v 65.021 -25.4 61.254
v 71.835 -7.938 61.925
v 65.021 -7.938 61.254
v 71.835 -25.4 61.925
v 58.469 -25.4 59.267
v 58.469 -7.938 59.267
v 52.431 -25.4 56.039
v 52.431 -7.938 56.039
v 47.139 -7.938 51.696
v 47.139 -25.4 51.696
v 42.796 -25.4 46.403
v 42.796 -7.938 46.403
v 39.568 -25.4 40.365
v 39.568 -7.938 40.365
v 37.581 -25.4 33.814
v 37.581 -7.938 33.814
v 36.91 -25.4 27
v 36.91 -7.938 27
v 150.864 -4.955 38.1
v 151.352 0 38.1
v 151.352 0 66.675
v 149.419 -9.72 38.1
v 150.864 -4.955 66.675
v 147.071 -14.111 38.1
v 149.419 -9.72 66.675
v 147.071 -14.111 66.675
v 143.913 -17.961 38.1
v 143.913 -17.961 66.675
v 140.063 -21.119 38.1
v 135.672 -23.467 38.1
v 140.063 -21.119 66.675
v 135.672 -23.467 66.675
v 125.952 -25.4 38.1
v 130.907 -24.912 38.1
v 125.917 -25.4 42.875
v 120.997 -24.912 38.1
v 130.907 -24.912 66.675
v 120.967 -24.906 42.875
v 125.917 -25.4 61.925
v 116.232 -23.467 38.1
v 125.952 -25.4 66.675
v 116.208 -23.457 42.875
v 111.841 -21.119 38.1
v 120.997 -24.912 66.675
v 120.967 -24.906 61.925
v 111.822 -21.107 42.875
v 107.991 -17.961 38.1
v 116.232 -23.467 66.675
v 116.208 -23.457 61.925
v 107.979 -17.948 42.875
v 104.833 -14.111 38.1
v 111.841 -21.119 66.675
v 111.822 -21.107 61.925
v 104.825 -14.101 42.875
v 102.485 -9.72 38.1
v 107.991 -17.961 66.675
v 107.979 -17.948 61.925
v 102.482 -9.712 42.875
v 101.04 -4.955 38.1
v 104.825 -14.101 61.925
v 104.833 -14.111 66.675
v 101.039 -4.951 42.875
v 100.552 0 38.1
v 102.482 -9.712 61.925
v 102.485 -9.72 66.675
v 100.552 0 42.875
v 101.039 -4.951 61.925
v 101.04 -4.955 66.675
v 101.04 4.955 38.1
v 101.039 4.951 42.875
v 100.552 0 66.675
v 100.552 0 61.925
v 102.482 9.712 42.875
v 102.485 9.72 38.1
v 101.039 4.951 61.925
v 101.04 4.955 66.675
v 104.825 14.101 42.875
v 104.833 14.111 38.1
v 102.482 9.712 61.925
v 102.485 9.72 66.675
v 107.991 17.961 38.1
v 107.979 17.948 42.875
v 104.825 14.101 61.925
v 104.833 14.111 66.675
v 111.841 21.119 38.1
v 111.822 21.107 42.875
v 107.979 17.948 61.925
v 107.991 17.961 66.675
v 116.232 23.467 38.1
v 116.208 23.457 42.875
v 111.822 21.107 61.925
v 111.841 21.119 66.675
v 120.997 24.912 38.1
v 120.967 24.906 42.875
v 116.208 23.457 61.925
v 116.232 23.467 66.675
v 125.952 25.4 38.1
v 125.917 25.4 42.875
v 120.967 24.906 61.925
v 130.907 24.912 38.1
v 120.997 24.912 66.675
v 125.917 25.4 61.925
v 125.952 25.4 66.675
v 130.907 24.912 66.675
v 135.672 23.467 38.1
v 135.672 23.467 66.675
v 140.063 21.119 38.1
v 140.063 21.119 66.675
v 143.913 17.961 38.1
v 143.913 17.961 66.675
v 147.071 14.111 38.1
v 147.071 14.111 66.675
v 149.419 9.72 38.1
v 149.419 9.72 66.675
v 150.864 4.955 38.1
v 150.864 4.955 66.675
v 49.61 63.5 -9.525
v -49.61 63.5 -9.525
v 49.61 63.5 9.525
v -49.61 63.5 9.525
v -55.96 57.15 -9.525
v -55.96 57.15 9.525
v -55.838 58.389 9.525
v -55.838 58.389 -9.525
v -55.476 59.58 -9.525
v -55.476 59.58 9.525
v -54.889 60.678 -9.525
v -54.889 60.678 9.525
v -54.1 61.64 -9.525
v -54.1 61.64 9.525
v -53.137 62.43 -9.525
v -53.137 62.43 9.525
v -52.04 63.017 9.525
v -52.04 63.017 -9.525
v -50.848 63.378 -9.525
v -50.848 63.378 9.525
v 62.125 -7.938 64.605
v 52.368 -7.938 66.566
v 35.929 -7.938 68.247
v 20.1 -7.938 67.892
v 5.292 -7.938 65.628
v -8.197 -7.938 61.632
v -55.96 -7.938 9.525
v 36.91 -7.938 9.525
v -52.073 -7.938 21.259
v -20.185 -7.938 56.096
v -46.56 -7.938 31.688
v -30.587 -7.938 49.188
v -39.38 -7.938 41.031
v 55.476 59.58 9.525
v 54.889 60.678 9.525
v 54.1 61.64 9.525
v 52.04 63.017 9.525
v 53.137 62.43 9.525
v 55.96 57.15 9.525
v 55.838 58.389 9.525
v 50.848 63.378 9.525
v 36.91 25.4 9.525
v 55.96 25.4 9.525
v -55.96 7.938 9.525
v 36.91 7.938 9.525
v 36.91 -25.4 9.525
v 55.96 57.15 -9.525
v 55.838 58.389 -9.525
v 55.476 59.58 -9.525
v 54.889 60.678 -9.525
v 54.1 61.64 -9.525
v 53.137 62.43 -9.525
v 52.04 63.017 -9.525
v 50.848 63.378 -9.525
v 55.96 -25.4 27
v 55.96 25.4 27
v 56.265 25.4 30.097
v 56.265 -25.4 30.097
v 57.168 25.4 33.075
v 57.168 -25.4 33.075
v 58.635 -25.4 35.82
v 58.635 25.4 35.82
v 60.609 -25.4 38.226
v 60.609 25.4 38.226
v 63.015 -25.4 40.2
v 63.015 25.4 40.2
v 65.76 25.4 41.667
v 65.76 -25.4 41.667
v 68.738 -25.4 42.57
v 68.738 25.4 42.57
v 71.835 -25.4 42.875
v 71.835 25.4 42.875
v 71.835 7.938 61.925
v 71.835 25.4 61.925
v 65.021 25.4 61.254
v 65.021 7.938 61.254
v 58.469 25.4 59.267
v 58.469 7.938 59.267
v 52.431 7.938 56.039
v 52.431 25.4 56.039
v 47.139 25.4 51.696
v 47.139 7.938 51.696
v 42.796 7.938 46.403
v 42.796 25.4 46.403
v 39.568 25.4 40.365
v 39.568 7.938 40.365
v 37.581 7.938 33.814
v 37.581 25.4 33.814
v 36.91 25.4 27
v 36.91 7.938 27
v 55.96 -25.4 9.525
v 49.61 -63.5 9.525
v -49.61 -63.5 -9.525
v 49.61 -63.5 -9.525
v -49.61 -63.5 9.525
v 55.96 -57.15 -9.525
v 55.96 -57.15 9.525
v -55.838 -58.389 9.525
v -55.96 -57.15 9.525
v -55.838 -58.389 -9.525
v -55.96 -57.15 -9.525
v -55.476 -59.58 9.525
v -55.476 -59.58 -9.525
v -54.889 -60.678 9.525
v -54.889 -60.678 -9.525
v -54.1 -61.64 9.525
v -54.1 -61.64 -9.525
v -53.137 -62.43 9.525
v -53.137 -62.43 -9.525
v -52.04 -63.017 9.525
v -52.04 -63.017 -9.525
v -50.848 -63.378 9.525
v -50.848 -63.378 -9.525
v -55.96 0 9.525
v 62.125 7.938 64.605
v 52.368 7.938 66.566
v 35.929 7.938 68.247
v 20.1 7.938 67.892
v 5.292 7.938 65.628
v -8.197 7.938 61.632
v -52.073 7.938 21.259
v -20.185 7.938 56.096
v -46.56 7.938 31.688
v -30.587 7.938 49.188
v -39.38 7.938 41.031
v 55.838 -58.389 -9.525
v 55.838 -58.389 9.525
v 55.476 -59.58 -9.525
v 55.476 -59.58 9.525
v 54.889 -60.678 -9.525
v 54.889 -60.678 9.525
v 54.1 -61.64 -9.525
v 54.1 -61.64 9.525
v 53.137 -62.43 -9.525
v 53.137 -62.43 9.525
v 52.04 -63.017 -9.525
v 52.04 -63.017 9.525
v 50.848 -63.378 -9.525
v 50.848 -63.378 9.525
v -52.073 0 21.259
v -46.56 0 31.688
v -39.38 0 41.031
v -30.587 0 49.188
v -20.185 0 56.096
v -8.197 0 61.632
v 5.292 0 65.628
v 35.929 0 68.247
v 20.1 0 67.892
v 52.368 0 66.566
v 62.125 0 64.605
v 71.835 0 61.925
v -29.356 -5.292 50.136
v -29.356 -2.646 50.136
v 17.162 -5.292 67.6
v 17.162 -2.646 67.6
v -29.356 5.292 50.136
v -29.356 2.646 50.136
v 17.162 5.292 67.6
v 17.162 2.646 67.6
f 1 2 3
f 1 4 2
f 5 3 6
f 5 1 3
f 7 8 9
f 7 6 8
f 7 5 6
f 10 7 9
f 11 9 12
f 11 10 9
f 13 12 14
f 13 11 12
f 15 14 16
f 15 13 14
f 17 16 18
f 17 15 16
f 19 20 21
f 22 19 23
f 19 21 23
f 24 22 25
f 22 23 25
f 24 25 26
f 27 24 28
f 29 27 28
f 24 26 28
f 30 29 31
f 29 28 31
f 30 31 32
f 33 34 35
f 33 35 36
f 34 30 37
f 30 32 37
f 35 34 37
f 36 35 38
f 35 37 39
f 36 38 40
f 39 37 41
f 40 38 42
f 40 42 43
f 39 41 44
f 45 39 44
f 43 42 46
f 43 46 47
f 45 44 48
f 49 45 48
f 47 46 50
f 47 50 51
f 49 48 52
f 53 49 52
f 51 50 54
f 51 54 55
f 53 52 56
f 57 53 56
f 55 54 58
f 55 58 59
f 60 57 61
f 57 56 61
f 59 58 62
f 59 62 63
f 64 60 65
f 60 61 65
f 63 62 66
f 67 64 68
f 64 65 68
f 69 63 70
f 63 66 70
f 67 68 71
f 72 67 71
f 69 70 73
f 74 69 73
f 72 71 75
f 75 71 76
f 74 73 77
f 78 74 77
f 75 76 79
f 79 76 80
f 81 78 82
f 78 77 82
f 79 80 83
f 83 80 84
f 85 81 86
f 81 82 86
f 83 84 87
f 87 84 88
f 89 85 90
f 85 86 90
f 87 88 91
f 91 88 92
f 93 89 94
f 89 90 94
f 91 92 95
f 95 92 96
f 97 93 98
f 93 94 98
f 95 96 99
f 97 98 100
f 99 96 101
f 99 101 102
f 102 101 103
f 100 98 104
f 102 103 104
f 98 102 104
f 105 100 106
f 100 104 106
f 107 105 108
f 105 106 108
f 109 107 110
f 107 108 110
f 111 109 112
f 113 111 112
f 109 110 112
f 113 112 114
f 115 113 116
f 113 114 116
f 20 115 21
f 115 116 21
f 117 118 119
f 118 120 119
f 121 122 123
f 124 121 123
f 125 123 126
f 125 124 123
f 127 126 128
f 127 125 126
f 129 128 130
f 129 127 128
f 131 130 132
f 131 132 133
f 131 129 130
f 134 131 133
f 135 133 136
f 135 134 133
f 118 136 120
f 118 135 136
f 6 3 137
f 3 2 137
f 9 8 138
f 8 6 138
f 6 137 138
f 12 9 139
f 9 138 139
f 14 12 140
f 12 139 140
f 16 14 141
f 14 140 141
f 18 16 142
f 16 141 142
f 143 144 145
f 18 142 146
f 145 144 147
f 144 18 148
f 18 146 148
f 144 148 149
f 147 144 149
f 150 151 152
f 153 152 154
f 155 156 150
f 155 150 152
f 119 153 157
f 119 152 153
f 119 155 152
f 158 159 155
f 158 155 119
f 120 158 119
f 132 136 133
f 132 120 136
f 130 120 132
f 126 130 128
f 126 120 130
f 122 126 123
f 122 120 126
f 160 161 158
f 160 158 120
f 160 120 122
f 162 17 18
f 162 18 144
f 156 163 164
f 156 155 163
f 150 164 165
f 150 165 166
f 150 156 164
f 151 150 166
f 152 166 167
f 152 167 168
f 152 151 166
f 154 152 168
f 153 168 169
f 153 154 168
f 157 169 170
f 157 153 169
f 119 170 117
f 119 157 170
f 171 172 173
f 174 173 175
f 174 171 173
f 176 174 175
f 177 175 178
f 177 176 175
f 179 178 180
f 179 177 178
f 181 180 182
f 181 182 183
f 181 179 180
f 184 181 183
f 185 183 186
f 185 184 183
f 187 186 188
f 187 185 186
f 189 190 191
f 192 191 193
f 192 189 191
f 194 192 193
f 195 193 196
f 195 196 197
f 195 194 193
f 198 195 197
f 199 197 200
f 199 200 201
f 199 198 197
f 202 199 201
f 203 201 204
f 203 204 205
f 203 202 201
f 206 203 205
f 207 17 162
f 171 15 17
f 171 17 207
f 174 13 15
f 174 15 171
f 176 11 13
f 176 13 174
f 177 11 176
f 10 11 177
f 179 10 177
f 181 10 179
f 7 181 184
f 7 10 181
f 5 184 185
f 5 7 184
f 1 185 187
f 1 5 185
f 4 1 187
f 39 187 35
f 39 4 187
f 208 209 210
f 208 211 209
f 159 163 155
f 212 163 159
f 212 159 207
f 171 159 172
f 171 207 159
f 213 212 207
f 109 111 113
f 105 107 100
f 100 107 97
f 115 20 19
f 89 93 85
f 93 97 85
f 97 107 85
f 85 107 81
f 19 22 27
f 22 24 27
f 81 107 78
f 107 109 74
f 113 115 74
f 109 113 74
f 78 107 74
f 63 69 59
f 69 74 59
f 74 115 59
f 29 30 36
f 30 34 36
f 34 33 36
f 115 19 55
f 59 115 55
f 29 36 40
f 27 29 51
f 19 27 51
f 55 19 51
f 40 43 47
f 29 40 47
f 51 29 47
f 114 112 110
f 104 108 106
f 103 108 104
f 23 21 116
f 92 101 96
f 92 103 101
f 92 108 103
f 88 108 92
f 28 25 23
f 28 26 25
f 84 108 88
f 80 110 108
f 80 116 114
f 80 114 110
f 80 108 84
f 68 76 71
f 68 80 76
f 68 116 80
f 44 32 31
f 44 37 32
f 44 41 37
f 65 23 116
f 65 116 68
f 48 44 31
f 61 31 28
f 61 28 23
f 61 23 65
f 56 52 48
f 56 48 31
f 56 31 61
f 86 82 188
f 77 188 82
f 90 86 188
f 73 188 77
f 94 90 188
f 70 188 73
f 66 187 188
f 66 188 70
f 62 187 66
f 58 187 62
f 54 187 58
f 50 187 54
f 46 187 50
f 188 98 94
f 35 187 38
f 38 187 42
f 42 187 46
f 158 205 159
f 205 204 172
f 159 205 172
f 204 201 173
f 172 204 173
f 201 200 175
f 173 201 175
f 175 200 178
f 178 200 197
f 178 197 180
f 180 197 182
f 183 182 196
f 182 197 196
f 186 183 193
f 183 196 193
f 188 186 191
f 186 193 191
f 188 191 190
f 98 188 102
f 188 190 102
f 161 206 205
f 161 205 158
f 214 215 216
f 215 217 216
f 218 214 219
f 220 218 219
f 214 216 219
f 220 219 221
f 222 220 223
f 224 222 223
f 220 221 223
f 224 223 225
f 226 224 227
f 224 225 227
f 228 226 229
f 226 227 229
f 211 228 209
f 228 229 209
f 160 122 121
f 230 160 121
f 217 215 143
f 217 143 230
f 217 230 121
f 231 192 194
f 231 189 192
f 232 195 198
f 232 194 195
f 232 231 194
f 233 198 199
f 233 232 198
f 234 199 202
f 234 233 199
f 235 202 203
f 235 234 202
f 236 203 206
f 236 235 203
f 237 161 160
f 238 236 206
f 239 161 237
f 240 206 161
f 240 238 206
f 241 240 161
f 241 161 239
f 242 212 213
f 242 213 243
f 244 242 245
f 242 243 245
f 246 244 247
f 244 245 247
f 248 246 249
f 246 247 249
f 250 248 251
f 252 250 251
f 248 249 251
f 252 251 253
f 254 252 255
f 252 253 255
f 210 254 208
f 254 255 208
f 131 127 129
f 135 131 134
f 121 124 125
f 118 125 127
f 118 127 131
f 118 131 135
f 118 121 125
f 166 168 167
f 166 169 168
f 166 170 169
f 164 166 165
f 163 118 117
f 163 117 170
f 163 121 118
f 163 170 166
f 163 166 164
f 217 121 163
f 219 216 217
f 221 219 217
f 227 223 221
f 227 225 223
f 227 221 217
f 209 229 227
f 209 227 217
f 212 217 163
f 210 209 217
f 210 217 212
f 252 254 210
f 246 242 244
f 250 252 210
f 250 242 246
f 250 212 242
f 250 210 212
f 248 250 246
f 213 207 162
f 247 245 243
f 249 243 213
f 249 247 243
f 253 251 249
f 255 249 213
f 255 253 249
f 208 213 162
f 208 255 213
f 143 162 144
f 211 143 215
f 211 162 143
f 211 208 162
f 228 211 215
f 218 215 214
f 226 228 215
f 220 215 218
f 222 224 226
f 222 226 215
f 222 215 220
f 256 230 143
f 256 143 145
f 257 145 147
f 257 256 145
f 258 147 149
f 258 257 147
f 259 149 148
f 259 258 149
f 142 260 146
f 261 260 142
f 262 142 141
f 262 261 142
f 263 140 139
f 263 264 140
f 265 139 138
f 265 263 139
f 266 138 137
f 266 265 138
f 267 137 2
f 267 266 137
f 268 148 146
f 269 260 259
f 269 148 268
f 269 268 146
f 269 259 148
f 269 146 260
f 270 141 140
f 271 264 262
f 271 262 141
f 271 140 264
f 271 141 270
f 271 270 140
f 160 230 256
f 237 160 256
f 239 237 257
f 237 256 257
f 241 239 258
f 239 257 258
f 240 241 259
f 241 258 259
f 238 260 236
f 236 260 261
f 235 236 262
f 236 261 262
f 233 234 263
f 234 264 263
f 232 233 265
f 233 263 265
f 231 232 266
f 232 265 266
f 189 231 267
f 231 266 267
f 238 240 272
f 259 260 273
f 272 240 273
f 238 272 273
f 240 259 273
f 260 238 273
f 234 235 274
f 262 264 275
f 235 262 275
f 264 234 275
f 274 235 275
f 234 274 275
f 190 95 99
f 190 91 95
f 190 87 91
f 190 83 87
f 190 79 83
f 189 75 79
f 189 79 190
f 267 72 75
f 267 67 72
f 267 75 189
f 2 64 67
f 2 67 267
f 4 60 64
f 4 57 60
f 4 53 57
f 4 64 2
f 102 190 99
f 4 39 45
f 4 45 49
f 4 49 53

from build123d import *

# Parameters (mm, degrees)
F1_DEPTH = 63.5
F0_W     = 25.3651374038
F0_H     = 19.05
F2_DEPTH = 25.4
F3_DEPTH = 7.9375
F0_W_2   = 25.4
F0_H_2   = 28.575
F5_R     = 6.35


with BuildPart() as f1:
    # F0 (on Front) → F1 (new body, symmetric)
    with BuildSketch(Plane.XZ):
        Polygon((36.9096121311, 9.525), (-55.9596121311, 9.525), (-55.9596121311, -9.525), (55.9596121311, -9.525), (55.9596121311, 9.525), align=None)
    extrude(amount=F1_DEPTH, both=True)

    # F0 (on Front) → F2 (join, symmetric)
    with BuildSketch(Plane.XZ):
        with BuildLine():
            Line((36.9096121311, 27.0002), (36.9096121311, 9.525))
            Line((36.9096121311, 9.525), (55.9596121311, 9.525))
            Line((55.9596121311, 9.525), (55.9596121311, 27.0002))
            ThreePointArc((55.9596121311, 27.0002), (60.6092919798, 38.2255201513), (71.8346121311, 42.8752))
            Line((71.8346121311, 42.8752), (100.552007556, 42.8752))
            Line((100.552007556, 42.8752), (100.552007556, 61.9252))
            Line((100.552007556, 61.9252), (71.8346121311, 61.9252))
            ThreePointArc((71.8346121311, 61.9252), (47.1389077982, 51.6959043329), (36.9096121311, 27.0002))
        make_face()
        with Locations((113.2345762579, 52.4002)):
            Rectangle(F0_W, F0_H)
    extrude(amount=F2_DEPTH, both=True)

    # F0 (on Front) → F3 (join, symmetric)
    with BuildSketch(Plane.XZ):
        with BuildLine():
            add(Edge.make_bspline(
                [(-55.9596121311, 9.525), (-43.233461678, 61.7118962109), (17.0044116676, 79.1671946645), (71.8346121311, 61.9252)],
                knots=[0, 0, 0, 0, 138.1200373401, 138.1200373401, 138.1200373401, 138.1200373401], degree=3))
            Line((-55.9596121311, 9.525), (36.9096121311, 9.525))
            Line((36.9096121311, 9.525), (36.9096121311, 27.0002))
            ThreePointArc((36.9096121311, 27.0002), (47.1389077982, 51.6959043329), (71.8346121311, 61.9252))
        make_face()
    extrude(amount=F3_DEPTH, both=True)

    # F0 (on Front) → F4 (revolve)
    with BuildSketch(Plane.XZ):
        with Locations((138.652007556, 52.3875)):
            Rectangle(F0_W_2, F0_H_2)
    revolve(axis=Axis((125.952007556, 0, 52.3875), (0, 0, -1)))

    # F5
    f5_edges = [f1.edges().sort_by_distance(p)[0] for p in [
        (-55.959612, -63.5, 0),
        (55.959612, -63.5, 0),
        (55.959612, 63.5, 0),
        (-55.959612, 63.5, 0),
    ]]
    fillet(f5_edges, radius=F5_R)


solid = f1.part
